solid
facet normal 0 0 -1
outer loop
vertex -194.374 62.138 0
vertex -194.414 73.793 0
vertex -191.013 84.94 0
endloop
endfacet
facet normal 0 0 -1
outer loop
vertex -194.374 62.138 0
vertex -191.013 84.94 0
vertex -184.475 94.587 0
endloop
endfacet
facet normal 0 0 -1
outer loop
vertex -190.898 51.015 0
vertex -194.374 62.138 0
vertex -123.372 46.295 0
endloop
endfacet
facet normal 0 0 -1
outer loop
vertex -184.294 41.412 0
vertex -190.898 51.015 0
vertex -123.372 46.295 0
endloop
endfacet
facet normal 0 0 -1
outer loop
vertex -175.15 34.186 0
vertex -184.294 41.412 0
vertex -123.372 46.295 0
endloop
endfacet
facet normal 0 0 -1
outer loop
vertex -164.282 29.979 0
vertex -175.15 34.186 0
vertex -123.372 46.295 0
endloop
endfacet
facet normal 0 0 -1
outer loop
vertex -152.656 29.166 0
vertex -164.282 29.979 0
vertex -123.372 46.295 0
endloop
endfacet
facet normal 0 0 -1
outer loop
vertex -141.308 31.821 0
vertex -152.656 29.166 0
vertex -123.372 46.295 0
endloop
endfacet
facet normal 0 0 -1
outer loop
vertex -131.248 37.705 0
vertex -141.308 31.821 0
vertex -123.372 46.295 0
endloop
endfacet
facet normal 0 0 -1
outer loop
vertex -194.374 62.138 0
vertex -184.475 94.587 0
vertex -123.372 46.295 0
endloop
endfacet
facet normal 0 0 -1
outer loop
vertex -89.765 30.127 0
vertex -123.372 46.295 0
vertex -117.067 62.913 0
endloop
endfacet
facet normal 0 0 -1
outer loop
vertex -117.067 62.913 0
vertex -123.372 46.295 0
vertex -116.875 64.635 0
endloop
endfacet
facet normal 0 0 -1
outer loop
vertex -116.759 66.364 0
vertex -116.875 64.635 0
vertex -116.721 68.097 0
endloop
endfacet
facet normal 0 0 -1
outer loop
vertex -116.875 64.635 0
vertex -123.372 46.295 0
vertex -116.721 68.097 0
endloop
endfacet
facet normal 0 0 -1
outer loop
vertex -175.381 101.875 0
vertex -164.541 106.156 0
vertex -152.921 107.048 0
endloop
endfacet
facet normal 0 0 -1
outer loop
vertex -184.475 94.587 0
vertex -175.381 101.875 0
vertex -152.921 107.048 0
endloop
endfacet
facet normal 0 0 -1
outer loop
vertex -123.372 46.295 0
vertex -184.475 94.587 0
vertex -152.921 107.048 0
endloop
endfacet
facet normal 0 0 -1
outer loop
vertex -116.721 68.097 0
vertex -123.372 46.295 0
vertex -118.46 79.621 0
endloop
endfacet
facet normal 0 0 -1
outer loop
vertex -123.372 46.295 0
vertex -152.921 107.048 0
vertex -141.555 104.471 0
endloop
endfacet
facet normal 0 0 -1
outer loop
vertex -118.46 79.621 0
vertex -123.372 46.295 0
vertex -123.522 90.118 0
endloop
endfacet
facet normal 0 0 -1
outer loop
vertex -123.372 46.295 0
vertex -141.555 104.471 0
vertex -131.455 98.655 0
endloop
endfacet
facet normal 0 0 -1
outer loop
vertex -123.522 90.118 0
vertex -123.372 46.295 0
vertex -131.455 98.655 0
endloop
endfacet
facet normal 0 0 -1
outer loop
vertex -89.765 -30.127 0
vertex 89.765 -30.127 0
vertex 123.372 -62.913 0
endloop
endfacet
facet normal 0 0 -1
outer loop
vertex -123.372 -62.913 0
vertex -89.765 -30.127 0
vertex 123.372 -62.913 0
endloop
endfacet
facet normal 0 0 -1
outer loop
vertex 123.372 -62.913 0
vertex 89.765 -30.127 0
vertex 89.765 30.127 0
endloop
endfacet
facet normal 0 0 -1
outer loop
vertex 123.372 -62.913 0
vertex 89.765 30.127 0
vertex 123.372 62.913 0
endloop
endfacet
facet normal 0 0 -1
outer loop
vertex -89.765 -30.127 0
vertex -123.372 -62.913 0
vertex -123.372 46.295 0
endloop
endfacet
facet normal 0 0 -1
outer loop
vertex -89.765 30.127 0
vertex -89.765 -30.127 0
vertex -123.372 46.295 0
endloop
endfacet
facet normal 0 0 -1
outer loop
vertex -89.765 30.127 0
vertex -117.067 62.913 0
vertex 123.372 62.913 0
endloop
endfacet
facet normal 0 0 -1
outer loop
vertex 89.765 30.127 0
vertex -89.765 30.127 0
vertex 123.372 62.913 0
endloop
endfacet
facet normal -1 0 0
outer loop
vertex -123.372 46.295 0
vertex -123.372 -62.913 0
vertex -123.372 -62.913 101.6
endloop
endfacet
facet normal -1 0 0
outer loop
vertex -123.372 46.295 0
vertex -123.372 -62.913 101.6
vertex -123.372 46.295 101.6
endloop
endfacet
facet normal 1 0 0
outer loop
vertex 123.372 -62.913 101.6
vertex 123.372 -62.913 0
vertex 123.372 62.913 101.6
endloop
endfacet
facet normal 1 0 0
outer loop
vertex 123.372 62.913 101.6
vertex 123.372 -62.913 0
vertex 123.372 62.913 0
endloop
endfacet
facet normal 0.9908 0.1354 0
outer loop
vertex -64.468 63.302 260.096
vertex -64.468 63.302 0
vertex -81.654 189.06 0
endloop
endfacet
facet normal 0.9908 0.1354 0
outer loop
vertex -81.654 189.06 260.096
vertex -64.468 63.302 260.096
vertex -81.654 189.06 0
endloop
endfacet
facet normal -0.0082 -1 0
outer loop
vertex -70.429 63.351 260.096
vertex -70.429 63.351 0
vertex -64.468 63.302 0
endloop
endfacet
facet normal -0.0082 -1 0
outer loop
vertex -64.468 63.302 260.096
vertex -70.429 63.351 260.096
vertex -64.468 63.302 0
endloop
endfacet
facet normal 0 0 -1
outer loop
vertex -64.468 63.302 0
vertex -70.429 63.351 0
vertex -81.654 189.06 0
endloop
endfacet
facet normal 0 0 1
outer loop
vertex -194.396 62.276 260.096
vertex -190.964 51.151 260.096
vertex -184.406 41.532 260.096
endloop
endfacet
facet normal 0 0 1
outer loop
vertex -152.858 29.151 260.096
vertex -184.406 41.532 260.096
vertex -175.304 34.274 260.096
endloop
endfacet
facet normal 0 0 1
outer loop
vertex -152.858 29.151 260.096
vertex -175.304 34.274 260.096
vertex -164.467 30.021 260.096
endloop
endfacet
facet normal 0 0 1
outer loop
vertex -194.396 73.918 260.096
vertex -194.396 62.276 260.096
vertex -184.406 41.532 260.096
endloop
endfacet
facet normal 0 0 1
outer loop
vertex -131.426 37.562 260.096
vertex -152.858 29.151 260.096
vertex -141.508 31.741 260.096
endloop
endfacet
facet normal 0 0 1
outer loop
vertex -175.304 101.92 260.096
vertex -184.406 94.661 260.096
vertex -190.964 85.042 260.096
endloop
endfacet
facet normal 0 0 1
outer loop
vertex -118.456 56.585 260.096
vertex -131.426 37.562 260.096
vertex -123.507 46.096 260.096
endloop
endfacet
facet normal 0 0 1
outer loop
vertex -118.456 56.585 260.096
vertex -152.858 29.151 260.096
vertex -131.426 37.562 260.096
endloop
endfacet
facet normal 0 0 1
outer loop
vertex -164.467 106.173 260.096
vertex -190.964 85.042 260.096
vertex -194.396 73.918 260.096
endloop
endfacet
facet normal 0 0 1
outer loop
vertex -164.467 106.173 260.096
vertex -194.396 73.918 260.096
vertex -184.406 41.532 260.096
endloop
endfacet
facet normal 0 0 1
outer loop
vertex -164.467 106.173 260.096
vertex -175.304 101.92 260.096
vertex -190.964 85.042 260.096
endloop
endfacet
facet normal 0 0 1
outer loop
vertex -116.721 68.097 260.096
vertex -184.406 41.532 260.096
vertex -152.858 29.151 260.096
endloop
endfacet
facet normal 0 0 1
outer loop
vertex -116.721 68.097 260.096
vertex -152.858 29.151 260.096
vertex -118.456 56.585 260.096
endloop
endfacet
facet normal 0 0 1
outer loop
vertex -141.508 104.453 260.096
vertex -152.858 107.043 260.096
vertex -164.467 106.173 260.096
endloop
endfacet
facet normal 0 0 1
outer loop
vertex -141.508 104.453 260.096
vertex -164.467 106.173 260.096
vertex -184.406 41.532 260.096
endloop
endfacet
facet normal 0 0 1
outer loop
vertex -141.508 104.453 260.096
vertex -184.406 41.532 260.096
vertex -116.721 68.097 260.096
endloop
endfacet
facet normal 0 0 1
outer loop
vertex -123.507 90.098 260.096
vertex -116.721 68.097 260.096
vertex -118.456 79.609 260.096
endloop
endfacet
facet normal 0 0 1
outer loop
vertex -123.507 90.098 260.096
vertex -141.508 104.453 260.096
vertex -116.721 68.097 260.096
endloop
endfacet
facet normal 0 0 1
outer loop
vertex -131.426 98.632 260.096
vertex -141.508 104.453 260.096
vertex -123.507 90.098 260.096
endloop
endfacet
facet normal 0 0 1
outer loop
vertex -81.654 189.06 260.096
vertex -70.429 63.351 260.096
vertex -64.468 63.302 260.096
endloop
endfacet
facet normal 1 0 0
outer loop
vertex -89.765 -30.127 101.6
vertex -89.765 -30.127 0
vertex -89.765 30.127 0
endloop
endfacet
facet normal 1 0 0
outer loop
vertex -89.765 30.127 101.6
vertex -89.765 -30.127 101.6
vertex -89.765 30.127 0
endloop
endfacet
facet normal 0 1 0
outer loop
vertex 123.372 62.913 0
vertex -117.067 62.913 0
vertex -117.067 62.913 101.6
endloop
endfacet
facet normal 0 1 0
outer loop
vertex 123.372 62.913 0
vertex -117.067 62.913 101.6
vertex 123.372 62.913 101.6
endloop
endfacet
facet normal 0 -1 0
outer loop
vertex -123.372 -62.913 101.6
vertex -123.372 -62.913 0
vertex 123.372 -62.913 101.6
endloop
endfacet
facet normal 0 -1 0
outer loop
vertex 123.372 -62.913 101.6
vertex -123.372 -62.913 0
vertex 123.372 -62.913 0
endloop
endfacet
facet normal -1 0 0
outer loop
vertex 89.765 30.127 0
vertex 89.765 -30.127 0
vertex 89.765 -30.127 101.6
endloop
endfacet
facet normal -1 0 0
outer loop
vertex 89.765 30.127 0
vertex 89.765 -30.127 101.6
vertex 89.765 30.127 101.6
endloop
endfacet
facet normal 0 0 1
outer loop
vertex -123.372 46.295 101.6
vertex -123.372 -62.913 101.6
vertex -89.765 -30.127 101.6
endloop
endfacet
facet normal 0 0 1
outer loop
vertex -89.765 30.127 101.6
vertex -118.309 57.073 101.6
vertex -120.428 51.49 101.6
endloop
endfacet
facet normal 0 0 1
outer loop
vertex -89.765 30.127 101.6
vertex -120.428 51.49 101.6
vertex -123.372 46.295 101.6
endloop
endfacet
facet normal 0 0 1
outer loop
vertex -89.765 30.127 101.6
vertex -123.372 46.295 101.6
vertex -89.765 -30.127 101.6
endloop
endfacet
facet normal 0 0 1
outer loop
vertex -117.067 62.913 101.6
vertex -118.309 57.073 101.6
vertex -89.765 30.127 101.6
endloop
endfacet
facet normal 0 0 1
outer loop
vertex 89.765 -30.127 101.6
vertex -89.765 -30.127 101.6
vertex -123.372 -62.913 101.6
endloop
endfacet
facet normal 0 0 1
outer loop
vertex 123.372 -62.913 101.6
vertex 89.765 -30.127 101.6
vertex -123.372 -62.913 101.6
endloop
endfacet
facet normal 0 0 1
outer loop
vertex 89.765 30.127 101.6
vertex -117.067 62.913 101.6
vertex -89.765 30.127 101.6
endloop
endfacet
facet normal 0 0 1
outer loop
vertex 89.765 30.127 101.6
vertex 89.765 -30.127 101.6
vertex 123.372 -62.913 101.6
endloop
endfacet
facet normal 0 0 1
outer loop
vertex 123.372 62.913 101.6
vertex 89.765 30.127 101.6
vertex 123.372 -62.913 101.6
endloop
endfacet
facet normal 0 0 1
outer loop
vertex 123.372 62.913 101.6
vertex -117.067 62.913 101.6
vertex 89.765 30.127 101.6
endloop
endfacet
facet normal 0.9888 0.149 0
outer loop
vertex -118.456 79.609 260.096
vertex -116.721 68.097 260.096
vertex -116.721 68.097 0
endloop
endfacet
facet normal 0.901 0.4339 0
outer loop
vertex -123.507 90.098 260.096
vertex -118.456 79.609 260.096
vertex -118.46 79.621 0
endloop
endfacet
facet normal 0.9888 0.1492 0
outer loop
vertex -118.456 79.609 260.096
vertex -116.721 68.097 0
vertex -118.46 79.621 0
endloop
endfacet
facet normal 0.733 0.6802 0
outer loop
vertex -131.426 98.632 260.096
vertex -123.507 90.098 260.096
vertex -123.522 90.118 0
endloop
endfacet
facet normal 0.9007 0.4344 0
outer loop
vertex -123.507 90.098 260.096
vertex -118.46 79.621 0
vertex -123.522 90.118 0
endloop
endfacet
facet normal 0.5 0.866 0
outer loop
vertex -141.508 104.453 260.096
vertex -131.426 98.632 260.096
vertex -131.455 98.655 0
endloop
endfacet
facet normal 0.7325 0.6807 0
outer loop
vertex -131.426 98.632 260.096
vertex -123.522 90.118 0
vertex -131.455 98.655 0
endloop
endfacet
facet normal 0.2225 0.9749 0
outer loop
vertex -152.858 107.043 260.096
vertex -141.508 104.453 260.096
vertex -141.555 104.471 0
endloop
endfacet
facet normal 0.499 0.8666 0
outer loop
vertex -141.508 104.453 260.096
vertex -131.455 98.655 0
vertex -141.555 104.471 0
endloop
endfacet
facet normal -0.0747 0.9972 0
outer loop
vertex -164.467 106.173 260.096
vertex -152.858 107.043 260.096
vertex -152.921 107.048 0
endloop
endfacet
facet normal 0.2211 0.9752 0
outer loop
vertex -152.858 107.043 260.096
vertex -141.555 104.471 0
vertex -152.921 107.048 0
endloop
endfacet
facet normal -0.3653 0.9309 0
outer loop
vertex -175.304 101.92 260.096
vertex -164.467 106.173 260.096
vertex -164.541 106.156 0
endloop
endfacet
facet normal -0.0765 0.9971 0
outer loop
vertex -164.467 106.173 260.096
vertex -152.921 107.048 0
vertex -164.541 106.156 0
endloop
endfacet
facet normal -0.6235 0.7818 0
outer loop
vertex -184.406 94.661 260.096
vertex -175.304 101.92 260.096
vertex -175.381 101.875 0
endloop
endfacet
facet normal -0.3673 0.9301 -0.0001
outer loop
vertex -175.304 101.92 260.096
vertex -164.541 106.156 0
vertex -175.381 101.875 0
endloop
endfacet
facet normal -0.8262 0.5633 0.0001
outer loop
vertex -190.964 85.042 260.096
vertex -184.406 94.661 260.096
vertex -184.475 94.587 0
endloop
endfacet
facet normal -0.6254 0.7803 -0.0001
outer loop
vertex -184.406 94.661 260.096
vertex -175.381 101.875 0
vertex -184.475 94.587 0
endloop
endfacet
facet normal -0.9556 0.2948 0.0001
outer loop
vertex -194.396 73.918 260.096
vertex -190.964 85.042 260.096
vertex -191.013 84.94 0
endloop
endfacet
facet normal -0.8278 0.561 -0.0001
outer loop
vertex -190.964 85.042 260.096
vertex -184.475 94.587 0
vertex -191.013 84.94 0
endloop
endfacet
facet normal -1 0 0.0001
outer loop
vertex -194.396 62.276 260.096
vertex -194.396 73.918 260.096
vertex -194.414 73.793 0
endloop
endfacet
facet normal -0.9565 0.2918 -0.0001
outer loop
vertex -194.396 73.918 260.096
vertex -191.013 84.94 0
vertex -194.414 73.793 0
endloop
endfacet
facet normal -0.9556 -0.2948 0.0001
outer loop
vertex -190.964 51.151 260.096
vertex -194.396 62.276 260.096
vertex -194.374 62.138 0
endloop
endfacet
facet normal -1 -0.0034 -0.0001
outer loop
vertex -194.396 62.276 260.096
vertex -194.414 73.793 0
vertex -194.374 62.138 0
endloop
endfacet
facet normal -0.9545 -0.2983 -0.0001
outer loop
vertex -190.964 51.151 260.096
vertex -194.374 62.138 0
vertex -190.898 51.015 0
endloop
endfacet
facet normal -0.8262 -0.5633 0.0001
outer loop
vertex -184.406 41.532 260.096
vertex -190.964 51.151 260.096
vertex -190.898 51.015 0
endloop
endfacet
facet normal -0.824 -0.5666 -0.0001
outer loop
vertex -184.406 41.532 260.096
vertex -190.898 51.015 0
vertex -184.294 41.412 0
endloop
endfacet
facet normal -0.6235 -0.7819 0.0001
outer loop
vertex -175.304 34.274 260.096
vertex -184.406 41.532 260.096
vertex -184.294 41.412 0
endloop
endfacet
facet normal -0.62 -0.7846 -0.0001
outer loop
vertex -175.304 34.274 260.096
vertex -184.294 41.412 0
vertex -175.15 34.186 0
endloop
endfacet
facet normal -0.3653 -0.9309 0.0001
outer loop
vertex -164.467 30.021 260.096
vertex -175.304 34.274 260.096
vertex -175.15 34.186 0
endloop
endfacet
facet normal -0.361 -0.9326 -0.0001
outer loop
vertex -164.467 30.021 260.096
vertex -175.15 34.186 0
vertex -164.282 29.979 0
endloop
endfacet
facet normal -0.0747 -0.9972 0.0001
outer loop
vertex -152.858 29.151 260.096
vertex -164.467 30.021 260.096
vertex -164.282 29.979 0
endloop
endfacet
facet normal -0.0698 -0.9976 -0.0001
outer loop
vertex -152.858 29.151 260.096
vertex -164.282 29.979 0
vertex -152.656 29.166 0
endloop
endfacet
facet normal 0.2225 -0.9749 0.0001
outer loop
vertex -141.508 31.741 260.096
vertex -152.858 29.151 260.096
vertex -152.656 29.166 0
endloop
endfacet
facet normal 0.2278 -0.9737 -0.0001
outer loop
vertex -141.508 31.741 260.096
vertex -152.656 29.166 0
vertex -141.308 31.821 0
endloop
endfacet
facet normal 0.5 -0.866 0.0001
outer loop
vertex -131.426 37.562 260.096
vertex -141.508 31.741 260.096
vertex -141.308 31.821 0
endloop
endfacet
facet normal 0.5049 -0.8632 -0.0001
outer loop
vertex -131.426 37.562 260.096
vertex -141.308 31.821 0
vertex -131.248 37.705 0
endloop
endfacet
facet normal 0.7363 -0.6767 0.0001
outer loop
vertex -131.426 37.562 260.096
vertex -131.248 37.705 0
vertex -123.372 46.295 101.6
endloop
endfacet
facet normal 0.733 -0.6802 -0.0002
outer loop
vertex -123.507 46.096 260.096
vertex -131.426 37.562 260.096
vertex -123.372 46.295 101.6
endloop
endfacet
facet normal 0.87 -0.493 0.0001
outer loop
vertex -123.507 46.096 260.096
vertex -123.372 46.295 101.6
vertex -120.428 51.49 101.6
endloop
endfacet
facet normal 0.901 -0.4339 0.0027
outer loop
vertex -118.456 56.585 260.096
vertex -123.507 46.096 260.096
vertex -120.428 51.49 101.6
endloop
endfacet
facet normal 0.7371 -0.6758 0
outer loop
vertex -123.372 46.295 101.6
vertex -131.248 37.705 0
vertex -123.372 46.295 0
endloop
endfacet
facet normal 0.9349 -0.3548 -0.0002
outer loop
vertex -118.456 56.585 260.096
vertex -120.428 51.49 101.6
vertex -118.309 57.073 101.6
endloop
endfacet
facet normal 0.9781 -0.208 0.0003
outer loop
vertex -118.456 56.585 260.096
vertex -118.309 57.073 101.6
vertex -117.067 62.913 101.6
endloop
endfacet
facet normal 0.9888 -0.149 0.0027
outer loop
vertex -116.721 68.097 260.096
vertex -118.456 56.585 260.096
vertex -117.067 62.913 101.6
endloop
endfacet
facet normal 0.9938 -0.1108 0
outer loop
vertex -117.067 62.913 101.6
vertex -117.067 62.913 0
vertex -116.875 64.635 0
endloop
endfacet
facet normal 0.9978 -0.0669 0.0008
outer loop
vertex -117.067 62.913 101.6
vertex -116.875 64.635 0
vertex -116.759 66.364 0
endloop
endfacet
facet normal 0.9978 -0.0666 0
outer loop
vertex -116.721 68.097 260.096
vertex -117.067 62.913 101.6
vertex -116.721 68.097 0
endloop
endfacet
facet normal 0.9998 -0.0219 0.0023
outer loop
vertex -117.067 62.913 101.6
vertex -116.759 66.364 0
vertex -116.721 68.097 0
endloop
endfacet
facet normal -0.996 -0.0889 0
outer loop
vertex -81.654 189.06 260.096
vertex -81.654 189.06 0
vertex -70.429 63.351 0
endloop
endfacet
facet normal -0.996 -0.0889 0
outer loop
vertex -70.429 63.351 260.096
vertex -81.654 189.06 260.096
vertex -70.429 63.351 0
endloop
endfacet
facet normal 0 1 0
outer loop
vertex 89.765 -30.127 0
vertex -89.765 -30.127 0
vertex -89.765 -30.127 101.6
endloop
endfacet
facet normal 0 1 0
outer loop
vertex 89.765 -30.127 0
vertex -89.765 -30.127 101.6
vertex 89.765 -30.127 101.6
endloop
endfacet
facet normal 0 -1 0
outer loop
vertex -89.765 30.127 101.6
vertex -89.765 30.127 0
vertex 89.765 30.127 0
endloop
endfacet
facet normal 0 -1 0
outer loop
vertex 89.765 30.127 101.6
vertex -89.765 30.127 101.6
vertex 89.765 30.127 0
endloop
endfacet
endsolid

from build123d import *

# Parameters (mm, degrees)
F0_W     = 246.744648
F0_H     = 125.825778
F0_W_2   = 179.530456
F0_H_2   = 60.253986
F1_DEPTH = 101.6
F3_R     = 39.055368
F3_R_2   = 15.617245
F4_DEPTH = 260.096


with BuildPart() as f1:
    # F0 (on Top) → F1 (new body)
    with BuildSketch(Plane.XY):
        Rectangle(F0_W, F0_H)
        Rectangle(F0_W_2, F0_H_2, mode=Mode.SUBTRACT)
    extrude(amount=F1_DEPTH)

    # F3 (on Top) + F2 (on Top) → F4 (join)
    with BuildSketch(Plane.XY):
        with Locations((-155.776352, 68.096891)):
            Circle(F3_R)
        with Locations((-155.776352, 68.096891)):
            Circle(F3_R_2, mode=Mode.SUBTRACT)
        with Locations((-155.776352, 68.096891)):
            Circle(F3_R_2)
    with BuildSketch(Plane.XY):
        Polygon((-81.653555, 189.060374), (-70.428785, 63.350744), (-64.467981, 63.302405), align=None)
    extrude(amount=F4_DEPTH)


solid = f1.part
